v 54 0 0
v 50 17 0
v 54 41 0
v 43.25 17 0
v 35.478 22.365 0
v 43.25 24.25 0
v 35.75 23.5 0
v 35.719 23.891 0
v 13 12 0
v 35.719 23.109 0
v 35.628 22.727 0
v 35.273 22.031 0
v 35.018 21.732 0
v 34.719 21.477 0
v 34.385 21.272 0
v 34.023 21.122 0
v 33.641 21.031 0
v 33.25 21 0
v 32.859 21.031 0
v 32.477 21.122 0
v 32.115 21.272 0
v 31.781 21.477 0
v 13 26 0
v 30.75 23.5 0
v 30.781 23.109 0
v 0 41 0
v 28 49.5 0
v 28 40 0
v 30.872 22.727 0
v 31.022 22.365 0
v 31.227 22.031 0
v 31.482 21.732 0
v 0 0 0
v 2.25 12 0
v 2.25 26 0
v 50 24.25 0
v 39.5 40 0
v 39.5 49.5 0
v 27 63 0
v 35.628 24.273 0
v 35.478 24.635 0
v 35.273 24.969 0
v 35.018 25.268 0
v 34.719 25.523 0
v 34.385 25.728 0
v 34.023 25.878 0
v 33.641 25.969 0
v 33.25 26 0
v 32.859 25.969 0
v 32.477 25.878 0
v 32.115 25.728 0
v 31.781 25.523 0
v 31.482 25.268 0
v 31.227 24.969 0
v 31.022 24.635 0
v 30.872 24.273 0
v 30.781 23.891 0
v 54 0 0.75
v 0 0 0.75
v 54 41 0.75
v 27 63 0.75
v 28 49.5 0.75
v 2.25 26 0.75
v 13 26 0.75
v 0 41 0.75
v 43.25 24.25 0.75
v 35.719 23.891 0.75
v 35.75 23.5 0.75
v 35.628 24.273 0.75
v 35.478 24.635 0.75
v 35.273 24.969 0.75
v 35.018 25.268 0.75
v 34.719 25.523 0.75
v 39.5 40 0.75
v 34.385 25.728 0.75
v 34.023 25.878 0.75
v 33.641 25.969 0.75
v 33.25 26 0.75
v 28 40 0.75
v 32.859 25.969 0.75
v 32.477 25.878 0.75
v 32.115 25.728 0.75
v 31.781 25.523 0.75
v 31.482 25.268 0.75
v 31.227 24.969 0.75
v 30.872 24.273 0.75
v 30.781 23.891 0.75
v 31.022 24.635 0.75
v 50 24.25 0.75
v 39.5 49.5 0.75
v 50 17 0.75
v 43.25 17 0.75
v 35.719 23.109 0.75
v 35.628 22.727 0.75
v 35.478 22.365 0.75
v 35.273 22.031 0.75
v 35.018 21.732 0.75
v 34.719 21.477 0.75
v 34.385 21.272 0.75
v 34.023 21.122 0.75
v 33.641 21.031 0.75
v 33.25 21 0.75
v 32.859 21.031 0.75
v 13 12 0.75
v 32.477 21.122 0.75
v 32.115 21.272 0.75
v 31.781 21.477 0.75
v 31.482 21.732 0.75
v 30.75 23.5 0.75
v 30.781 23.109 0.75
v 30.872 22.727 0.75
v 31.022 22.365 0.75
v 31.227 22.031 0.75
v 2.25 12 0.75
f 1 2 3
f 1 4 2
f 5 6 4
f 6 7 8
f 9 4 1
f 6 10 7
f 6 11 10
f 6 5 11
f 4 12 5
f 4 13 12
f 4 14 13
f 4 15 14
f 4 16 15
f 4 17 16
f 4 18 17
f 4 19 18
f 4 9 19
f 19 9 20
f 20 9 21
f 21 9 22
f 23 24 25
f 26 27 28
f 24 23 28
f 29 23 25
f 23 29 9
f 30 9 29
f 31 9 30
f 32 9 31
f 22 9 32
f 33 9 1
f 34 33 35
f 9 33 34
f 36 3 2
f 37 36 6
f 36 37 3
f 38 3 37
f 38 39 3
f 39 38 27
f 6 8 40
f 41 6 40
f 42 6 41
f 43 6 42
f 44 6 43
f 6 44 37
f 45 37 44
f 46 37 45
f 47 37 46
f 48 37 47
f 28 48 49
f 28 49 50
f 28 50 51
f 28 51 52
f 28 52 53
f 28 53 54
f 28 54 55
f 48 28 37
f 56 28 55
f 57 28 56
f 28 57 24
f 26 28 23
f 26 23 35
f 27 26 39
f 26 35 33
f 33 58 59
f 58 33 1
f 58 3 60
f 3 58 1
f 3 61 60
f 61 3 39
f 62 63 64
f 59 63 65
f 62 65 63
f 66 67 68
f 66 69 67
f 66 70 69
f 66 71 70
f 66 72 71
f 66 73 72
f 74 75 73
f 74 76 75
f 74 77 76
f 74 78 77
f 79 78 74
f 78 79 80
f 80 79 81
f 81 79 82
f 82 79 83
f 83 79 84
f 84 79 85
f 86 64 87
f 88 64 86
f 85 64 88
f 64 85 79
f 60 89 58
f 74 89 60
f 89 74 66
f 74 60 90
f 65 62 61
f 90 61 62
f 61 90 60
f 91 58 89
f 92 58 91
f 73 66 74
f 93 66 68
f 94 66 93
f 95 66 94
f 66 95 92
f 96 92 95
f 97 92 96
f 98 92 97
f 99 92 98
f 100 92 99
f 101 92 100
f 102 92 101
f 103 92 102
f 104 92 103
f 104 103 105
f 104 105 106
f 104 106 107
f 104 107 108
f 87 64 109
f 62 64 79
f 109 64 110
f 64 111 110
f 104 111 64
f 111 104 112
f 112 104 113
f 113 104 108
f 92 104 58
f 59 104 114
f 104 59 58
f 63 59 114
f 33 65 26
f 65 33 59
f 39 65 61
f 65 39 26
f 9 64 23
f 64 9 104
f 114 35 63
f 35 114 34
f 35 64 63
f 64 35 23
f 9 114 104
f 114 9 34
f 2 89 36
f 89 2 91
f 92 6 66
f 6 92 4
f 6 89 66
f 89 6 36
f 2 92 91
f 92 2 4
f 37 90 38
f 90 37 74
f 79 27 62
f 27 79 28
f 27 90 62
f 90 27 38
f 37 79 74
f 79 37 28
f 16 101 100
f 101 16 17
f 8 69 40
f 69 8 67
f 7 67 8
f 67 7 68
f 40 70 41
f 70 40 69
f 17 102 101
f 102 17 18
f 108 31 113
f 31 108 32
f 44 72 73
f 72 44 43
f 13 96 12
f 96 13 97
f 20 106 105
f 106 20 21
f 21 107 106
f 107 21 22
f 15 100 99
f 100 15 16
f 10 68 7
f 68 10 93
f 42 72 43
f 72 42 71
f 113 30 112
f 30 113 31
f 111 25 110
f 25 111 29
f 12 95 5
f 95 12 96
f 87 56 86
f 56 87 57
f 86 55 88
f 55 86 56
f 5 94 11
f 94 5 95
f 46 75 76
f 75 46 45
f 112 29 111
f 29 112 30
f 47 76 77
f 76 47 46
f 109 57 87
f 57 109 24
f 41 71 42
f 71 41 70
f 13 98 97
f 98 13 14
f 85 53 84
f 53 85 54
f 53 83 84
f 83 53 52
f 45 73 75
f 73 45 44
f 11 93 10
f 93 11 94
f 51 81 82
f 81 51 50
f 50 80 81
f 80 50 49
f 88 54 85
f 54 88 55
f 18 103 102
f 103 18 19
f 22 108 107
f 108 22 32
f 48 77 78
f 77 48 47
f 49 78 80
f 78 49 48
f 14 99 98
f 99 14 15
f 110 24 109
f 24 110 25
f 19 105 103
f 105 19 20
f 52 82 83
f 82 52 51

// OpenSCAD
/*
    Projekt Name: Trennwaende fuer das Modellhaus 3723
    Modul:  Wand Nordseite
    Projekt URL: https://github.com/Hardi-St/MobaLedLib_Docu/tree/master/3D_Daten_fuer_die_MobaLedLib/Trennwände%20für%20Häuser
    Version: 0.0.1
    Autor: Moba-Nick (mobanick@wp12085804.server-he.de)
    Lizenz: CC-BY-SA-4.0 (https://creativecommons.org/licenses/by-sa/4.0/legalcode.de)
*/
//  Alle Angaben sind immer in mm bei meinen Projekten.
//  Parameter fuer die Wand
x_all = 54;  //Breite der Wand = Breite der Grundplatte
z_all = 0.75; //Wandstaerke gibnt an, wie Dick die Wand ist. 0.75 ist dick genug um kein Licht durchzulassen, aber duenn genug um Material zu sparen.
y_erdgeschoss = 41;     //Hoehe Erdgeschoss 
y_dachschraege = 22;    // Hoehe Dachgeschoss
y_all = y_erdgeschoss + y_dachschraege;

/*  Der Parameter "$fn" sagt, wie rund die Ausschnitte von Kreisen sind. Je hoeher die Zahl desto mehr Kreispunkte werden verwendet. Minimum ist 3, Maximum ist 999 (Ich nehme nie mehr als 150 sonst wird die Berechnungszeit zu gross). Als ideal haben sich Werte zwischen 35 und 45 ergeben. 
    Bei 3 wird es ein Dreieck, bei 4 eine Raute.
*/
$fn=40;
/* 
    Hier erfolgt die eigentliche Arbeit. Als erstes wird die komplette Wand erstellt mit Hilfe des Modules "HauptWand()". 
    Danach werden alle weiteren Elemente die in der Funktion "difference()" erstellt aus dieser Wand ausgeschnitten. Dadurch ergeben sich die Oeffnungen fuer die Fenster und Tueren, damit da Licht durchscheinen kann. 
    Weitere Informatioen zur Funktion "difference()" gibt es hier https://en.wikibooks.org/wiki/OpenSCAD_User_Manual/CSG_Modelling#difference
*/
difference(){
    HauptWand();
    Fenster(-24.75,12.00,10.75,14.0);
    Fenster(16.25,17.00,6.75,7.25);
    Fenster(1,40.00,11.50,9.50);
    Fenster_Rund(3.75,21.00,5.00);
}

/* 
!!!!!!!!!!!!!!!!!!!!!!!!!!!!!!!!!!!!!!!!!!!!!!!!!!!!!!!!!!!!!!!!!!!!   
!!!!    Ab hier kommen die Module. Bitte nur aendern wann man   !!!!
!!!!    weiss was man macht.                                    !!!!
!!!!!!!!!!!!!!!!!!!!!!!!!!!!!!!!!!!!!!!!!!!!!!!!!!!!!!!!!!!!!!!!!!!!
/*  
    Das Module HauptWand erstellt die Wand des Hauses inkl. der Dachschraege aus einen Polyhydron. Dazu wurde im Bereich fuer die Parameter in den  Zeilen 10 - 14 die Werte fuer die Breite der Wand (x_all) sowie die Höhe des Erdgeschosses (y_erdgeschoss) und des oberen Stockwerks (y_dachschraege) angeben.
*/
module HauptWand(){   
    //  PolyPunkte gibt an wo sicher welcher Punkt befindet. 
    //  Die Korrdinaten werden immer im Format [x,y,z] uebergeben.
    PolyPunkte = [
    [0,0,0],    // 0
    [0,y_erdgeschoss,0],    // 1
    [x_all/2,y_all,0],    // 2
    [x_all,y_erdgeschoss,0],    // 3
    [x_all,0,0],    // 4
    [0,0,z_all],    // 5
    [x_all,0,z_all],    // 6
    [x_all,y_erdgeschoss,z_all],    // 7
    [x_all/2,y_all,z_all],    // 8
    [0,y_erdgeschoss,z_all]];    // 9
    
    //  PolyFlaechen gibt an welche Punkte welche Flaechen beschreiben. 
    //  Die Korrdinaten werden immer im Format [x,y,z] uebergeben.
    PolyFlaechen =[
    [0,1,2,3,4],    // Unten (Boden)
    [5,0,4,6],      // Vorne (vordere Kante)
    [6,4,3,7],      // Rechts unten (Erdgeschoss)
    [7,3,2,8],      // Rechts oben  (Dachgeschoss/Dachschraege)
    [6,7,8,9,5],    // Oben (Deckel)
    [9,1,0,5],      // Links unten  (Erdgeschoss)
    [8,2,1,9]];     // Links oben   (Dachgeschoss/Dachschraege)
      
    polyhedron( PolyPunkte, PolyFlaechen );
}

/*  
    Das Module Fenster erstellt wie der Name schon sagt, die Ausschnitte fuer die Fenster.
    Dabei gibt es 4 Variablen die uebergeben werden.
    "pos_x" gibt die Startposition des linken unteren Ecke im Bezug zur Mittelachse des Hauses an.
    "pos_y" gibt die Startposition der inken untren Ecke im Bezug zur Grundplatte an.
    "size_x" gibt die Breite des Fensters an
    "size_y" gibt die Hoehe des Fensters an
    Beispiel: Der Befehl "Fenster(10,20,15,10);" erzeugt ein Fenster 10mm von der Mitte nach Rechts, auf der Hoehe von 20mm mit einer Breite von 15mm und einer Hoehe von 10mm;
*/
module Fenster(pos_x, pos_y, size_x, size_y){
    translate([x_all/2+pos_x, pos_y, 0]){
        cube([size_x,size_y,z_all*1.25],false);
    }
}

/*  
    Das Module Fenster_rund erstellt wie der Name schon sagt, die Ausschnitte fuer die Fenster mit rundem Ausschnitt.
    Dabei gibt es 3 Variablen die uebergeben werden.
    "pos_x" gibt die Startposition der linken unteren Ecke im Bezug zur Mittelachse des Hauses an.
    "pos_y" gibt die Startposition der inken unteren Ecke im Bezug zur Grundplatte an.
    "size_x" gibt die Breite des Fensters an
    Beispiel: Der Befehl "Fenster_rund(10,20,5);" erzeugt ein Fenster 10mm von der Mitte nach Rechts, auf der Hoehe von 20mm mit einem Durchmesser von 5mm;
*/
module Fenster_Rund(pos_x, pos_y, size_x){
    
    translate([x_all/2+pos_x+size_x/2, pos_y+size_x/2, 0]){
        cylinder(h=z_all*1.25,d=size_x,false);
    }
}
